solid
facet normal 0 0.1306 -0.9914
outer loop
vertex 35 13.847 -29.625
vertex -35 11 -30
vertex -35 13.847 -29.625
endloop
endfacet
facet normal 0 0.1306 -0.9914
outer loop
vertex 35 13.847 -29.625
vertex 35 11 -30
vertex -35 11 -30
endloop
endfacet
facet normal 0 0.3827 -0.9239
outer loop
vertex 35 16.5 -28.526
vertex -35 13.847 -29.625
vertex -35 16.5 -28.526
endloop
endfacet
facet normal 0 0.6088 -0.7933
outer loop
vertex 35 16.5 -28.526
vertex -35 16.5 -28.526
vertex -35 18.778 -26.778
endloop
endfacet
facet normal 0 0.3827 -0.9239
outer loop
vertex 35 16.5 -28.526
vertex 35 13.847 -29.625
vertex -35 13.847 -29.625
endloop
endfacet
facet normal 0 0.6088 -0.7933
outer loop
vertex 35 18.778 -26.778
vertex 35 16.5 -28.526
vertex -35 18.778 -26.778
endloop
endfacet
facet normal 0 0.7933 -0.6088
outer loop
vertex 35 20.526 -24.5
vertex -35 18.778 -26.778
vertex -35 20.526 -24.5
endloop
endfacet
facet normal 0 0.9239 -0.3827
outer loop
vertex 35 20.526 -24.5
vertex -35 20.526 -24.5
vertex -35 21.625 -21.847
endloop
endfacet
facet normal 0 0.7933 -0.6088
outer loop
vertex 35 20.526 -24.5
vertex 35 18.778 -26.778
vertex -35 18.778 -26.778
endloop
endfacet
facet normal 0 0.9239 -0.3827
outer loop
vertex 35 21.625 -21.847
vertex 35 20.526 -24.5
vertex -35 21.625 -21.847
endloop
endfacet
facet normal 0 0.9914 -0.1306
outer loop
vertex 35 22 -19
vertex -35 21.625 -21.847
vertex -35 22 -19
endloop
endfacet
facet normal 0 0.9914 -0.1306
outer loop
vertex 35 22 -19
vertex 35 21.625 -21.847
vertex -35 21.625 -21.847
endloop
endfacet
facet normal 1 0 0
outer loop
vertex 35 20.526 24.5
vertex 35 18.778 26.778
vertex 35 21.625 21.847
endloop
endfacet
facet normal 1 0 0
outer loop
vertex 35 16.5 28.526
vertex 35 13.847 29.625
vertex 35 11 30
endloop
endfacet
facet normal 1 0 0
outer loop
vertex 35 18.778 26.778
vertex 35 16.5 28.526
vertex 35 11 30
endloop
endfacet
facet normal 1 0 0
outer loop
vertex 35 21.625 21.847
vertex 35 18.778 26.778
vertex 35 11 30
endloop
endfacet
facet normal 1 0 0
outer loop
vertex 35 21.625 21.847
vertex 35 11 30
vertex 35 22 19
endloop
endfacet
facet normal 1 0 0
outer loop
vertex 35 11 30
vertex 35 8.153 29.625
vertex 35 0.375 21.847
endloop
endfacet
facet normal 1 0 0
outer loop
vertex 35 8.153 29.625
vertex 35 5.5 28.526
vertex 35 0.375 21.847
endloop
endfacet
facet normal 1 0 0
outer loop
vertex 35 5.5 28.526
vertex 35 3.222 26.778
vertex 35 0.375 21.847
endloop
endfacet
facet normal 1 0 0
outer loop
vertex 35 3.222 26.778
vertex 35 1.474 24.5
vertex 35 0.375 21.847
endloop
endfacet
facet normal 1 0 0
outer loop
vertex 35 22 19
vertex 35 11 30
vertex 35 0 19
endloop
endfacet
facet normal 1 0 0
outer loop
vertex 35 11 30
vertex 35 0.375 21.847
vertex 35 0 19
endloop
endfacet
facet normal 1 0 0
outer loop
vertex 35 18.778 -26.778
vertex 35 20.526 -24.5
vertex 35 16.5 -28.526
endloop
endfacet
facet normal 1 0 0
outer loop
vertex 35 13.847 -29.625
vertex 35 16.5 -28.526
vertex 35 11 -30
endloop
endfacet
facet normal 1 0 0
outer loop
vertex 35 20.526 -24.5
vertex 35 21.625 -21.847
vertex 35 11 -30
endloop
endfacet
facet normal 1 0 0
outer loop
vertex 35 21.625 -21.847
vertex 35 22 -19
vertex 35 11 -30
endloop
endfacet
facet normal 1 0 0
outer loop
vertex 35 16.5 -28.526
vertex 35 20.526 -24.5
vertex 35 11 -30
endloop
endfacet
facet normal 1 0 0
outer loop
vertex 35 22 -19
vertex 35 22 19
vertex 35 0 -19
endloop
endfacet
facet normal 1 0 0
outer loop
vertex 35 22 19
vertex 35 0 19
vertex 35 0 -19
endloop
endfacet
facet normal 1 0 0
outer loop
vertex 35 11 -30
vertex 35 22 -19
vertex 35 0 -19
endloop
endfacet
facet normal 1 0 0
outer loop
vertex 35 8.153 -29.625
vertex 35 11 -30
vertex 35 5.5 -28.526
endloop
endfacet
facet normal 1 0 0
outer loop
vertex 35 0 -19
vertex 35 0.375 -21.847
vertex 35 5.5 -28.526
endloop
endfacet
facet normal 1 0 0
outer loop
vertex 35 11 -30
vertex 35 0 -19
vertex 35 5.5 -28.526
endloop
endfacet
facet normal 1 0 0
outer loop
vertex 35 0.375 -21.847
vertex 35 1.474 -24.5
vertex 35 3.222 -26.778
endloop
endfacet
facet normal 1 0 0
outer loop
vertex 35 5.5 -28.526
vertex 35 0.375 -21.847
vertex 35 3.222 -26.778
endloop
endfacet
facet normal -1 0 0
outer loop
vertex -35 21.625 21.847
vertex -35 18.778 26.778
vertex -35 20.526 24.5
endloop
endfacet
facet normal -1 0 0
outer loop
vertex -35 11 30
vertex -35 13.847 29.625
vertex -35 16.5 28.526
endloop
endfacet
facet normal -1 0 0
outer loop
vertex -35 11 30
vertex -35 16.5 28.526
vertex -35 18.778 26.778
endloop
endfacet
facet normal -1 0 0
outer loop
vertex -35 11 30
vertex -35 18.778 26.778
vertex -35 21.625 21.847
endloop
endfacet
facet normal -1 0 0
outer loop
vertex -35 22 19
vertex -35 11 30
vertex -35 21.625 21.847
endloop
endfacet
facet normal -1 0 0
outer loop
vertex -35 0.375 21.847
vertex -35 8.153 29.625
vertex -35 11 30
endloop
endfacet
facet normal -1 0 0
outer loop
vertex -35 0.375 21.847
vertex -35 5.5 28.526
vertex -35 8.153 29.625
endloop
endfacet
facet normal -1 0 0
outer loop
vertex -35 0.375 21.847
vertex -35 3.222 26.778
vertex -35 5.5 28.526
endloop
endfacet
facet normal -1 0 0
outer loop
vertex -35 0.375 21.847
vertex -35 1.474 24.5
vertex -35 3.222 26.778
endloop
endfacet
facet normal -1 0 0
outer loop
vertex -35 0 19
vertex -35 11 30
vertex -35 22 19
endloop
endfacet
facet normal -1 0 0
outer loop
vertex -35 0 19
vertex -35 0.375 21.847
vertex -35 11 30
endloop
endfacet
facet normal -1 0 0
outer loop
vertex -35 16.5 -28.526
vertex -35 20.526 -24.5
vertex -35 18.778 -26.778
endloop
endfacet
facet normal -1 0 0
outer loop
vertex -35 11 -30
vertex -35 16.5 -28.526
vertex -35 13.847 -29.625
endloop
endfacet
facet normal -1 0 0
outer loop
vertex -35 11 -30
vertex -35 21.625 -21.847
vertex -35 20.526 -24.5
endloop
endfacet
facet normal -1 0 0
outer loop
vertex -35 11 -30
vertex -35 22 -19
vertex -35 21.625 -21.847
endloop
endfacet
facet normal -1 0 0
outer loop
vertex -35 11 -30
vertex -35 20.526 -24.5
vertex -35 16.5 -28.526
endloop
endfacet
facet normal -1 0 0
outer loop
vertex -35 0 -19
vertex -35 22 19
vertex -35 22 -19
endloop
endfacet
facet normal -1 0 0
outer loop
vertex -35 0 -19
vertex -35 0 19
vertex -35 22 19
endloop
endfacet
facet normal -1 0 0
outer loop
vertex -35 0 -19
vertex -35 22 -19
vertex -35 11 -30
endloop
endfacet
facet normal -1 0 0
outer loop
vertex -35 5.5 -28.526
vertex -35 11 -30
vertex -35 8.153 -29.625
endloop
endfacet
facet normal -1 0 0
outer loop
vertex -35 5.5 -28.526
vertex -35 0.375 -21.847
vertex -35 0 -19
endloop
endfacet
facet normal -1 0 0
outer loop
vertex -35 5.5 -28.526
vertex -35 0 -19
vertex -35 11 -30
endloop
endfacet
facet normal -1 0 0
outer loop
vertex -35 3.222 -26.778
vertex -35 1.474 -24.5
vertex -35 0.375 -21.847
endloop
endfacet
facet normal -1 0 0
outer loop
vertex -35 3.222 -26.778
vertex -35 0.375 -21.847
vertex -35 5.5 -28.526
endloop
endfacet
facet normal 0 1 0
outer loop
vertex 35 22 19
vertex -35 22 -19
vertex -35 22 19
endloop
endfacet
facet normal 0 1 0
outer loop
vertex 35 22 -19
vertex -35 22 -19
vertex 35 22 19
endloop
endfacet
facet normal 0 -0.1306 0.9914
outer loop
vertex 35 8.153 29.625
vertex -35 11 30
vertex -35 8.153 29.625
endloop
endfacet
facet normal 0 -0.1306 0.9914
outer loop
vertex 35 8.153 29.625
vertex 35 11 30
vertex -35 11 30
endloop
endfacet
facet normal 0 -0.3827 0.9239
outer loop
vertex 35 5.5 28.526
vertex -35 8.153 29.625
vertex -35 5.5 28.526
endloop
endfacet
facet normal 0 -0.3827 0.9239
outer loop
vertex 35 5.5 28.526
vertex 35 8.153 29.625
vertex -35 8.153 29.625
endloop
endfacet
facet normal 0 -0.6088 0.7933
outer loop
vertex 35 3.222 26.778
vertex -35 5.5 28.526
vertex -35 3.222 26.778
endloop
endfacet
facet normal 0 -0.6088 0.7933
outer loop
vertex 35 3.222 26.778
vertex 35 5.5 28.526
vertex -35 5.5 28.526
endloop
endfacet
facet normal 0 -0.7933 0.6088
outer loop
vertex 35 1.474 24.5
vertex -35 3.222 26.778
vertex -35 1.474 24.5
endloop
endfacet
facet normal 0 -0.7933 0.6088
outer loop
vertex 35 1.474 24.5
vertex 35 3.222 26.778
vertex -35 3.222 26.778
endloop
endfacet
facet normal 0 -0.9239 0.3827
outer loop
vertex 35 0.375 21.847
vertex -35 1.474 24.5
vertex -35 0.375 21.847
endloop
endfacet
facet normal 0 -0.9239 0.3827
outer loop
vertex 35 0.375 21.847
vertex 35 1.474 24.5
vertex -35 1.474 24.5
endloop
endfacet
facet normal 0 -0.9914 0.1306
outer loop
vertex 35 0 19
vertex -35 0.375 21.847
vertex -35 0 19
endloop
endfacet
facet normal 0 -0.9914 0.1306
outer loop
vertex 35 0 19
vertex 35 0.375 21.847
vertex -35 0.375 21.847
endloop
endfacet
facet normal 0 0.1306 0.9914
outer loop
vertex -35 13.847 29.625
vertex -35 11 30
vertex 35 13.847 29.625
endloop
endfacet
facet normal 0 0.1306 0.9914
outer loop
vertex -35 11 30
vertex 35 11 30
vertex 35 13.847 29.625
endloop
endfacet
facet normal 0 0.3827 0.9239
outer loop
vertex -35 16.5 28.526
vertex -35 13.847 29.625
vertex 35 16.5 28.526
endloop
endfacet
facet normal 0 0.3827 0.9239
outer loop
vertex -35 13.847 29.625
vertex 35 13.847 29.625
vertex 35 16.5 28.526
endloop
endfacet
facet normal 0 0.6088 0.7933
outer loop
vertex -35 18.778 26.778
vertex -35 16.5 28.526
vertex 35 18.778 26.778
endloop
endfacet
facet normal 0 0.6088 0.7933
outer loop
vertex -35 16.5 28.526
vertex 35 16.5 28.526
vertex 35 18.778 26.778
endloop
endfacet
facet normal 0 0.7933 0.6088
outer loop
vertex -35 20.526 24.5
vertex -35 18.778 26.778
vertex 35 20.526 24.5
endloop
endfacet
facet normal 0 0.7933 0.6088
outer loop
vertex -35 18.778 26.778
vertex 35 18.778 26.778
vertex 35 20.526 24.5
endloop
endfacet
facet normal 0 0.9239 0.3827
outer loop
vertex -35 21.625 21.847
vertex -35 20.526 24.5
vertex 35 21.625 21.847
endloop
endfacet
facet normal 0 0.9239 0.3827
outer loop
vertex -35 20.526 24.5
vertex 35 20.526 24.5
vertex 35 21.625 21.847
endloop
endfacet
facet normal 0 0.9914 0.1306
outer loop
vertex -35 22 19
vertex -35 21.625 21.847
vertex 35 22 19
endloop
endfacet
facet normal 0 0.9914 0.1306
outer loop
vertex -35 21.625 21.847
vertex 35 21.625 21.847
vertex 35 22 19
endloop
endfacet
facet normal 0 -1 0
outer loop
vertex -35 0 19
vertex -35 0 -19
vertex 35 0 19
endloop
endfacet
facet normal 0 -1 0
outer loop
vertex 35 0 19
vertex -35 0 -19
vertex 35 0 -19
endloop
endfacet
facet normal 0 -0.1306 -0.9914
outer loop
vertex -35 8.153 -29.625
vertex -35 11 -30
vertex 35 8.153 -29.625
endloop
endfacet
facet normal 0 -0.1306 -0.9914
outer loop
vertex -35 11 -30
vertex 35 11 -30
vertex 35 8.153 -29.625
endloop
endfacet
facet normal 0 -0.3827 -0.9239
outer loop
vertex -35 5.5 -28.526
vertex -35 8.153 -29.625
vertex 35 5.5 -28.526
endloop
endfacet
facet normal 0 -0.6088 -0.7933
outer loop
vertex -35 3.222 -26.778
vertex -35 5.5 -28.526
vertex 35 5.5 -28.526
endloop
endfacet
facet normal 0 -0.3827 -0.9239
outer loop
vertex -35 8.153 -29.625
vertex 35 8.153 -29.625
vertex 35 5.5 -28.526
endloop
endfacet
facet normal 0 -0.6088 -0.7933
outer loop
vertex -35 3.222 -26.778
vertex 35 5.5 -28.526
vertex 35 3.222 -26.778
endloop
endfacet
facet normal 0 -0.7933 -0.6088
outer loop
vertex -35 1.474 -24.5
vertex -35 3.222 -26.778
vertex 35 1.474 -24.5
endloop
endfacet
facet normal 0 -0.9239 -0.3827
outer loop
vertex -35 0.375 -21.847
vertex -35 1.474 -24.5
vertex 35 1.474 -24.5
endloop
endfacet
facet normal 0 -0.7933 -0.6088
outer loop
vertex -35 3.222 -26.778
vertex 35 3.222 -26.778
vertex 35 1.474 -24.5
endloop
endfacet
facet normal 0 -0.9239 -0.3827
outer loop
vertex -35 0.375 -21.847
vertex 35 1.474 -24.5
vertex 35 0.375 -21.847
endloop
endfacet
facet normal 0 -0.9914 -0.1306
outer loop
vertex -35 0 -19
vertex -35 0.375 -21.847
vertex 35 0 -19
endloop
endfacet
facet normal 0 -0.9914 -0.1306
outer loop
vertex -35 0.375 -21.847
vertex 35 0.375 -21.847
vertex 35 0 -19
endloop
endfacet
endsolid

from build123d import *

# Parameters (mm, degrees)
SKETCH_1_W      = 70
SKETCH_1_H      = 60
EXTRUDE_1_DEPTH = 22
FILLET_1_R      = 11


with BuildPart() as part:
    # 草图1 → 凸台-拉伸1 (new body)
    with BuildSketch(Plane(origin=(0, 0, 0), x_dir=(1, 0, 0), z_dir=(0, 1, 0))):
        Rectangle(SKETCH_1_W, SKETCH_1_H)
    extrude(amount=EXTRUDE_1_DEPTH)

    # 圆角1
    fillet_1_edges = [part.edges().sort_by_distance(p)[0] for p in [
        (0, 0, -30),
        (0, 22, -30),
        (0, 0, 30),
        (0, 22, 30),
    ]]
    fillet(fillet_1_edges, radius=FILLET_1_R - 0.0001)  # a hair under: the kernel refuses the full size


solid = part.part
